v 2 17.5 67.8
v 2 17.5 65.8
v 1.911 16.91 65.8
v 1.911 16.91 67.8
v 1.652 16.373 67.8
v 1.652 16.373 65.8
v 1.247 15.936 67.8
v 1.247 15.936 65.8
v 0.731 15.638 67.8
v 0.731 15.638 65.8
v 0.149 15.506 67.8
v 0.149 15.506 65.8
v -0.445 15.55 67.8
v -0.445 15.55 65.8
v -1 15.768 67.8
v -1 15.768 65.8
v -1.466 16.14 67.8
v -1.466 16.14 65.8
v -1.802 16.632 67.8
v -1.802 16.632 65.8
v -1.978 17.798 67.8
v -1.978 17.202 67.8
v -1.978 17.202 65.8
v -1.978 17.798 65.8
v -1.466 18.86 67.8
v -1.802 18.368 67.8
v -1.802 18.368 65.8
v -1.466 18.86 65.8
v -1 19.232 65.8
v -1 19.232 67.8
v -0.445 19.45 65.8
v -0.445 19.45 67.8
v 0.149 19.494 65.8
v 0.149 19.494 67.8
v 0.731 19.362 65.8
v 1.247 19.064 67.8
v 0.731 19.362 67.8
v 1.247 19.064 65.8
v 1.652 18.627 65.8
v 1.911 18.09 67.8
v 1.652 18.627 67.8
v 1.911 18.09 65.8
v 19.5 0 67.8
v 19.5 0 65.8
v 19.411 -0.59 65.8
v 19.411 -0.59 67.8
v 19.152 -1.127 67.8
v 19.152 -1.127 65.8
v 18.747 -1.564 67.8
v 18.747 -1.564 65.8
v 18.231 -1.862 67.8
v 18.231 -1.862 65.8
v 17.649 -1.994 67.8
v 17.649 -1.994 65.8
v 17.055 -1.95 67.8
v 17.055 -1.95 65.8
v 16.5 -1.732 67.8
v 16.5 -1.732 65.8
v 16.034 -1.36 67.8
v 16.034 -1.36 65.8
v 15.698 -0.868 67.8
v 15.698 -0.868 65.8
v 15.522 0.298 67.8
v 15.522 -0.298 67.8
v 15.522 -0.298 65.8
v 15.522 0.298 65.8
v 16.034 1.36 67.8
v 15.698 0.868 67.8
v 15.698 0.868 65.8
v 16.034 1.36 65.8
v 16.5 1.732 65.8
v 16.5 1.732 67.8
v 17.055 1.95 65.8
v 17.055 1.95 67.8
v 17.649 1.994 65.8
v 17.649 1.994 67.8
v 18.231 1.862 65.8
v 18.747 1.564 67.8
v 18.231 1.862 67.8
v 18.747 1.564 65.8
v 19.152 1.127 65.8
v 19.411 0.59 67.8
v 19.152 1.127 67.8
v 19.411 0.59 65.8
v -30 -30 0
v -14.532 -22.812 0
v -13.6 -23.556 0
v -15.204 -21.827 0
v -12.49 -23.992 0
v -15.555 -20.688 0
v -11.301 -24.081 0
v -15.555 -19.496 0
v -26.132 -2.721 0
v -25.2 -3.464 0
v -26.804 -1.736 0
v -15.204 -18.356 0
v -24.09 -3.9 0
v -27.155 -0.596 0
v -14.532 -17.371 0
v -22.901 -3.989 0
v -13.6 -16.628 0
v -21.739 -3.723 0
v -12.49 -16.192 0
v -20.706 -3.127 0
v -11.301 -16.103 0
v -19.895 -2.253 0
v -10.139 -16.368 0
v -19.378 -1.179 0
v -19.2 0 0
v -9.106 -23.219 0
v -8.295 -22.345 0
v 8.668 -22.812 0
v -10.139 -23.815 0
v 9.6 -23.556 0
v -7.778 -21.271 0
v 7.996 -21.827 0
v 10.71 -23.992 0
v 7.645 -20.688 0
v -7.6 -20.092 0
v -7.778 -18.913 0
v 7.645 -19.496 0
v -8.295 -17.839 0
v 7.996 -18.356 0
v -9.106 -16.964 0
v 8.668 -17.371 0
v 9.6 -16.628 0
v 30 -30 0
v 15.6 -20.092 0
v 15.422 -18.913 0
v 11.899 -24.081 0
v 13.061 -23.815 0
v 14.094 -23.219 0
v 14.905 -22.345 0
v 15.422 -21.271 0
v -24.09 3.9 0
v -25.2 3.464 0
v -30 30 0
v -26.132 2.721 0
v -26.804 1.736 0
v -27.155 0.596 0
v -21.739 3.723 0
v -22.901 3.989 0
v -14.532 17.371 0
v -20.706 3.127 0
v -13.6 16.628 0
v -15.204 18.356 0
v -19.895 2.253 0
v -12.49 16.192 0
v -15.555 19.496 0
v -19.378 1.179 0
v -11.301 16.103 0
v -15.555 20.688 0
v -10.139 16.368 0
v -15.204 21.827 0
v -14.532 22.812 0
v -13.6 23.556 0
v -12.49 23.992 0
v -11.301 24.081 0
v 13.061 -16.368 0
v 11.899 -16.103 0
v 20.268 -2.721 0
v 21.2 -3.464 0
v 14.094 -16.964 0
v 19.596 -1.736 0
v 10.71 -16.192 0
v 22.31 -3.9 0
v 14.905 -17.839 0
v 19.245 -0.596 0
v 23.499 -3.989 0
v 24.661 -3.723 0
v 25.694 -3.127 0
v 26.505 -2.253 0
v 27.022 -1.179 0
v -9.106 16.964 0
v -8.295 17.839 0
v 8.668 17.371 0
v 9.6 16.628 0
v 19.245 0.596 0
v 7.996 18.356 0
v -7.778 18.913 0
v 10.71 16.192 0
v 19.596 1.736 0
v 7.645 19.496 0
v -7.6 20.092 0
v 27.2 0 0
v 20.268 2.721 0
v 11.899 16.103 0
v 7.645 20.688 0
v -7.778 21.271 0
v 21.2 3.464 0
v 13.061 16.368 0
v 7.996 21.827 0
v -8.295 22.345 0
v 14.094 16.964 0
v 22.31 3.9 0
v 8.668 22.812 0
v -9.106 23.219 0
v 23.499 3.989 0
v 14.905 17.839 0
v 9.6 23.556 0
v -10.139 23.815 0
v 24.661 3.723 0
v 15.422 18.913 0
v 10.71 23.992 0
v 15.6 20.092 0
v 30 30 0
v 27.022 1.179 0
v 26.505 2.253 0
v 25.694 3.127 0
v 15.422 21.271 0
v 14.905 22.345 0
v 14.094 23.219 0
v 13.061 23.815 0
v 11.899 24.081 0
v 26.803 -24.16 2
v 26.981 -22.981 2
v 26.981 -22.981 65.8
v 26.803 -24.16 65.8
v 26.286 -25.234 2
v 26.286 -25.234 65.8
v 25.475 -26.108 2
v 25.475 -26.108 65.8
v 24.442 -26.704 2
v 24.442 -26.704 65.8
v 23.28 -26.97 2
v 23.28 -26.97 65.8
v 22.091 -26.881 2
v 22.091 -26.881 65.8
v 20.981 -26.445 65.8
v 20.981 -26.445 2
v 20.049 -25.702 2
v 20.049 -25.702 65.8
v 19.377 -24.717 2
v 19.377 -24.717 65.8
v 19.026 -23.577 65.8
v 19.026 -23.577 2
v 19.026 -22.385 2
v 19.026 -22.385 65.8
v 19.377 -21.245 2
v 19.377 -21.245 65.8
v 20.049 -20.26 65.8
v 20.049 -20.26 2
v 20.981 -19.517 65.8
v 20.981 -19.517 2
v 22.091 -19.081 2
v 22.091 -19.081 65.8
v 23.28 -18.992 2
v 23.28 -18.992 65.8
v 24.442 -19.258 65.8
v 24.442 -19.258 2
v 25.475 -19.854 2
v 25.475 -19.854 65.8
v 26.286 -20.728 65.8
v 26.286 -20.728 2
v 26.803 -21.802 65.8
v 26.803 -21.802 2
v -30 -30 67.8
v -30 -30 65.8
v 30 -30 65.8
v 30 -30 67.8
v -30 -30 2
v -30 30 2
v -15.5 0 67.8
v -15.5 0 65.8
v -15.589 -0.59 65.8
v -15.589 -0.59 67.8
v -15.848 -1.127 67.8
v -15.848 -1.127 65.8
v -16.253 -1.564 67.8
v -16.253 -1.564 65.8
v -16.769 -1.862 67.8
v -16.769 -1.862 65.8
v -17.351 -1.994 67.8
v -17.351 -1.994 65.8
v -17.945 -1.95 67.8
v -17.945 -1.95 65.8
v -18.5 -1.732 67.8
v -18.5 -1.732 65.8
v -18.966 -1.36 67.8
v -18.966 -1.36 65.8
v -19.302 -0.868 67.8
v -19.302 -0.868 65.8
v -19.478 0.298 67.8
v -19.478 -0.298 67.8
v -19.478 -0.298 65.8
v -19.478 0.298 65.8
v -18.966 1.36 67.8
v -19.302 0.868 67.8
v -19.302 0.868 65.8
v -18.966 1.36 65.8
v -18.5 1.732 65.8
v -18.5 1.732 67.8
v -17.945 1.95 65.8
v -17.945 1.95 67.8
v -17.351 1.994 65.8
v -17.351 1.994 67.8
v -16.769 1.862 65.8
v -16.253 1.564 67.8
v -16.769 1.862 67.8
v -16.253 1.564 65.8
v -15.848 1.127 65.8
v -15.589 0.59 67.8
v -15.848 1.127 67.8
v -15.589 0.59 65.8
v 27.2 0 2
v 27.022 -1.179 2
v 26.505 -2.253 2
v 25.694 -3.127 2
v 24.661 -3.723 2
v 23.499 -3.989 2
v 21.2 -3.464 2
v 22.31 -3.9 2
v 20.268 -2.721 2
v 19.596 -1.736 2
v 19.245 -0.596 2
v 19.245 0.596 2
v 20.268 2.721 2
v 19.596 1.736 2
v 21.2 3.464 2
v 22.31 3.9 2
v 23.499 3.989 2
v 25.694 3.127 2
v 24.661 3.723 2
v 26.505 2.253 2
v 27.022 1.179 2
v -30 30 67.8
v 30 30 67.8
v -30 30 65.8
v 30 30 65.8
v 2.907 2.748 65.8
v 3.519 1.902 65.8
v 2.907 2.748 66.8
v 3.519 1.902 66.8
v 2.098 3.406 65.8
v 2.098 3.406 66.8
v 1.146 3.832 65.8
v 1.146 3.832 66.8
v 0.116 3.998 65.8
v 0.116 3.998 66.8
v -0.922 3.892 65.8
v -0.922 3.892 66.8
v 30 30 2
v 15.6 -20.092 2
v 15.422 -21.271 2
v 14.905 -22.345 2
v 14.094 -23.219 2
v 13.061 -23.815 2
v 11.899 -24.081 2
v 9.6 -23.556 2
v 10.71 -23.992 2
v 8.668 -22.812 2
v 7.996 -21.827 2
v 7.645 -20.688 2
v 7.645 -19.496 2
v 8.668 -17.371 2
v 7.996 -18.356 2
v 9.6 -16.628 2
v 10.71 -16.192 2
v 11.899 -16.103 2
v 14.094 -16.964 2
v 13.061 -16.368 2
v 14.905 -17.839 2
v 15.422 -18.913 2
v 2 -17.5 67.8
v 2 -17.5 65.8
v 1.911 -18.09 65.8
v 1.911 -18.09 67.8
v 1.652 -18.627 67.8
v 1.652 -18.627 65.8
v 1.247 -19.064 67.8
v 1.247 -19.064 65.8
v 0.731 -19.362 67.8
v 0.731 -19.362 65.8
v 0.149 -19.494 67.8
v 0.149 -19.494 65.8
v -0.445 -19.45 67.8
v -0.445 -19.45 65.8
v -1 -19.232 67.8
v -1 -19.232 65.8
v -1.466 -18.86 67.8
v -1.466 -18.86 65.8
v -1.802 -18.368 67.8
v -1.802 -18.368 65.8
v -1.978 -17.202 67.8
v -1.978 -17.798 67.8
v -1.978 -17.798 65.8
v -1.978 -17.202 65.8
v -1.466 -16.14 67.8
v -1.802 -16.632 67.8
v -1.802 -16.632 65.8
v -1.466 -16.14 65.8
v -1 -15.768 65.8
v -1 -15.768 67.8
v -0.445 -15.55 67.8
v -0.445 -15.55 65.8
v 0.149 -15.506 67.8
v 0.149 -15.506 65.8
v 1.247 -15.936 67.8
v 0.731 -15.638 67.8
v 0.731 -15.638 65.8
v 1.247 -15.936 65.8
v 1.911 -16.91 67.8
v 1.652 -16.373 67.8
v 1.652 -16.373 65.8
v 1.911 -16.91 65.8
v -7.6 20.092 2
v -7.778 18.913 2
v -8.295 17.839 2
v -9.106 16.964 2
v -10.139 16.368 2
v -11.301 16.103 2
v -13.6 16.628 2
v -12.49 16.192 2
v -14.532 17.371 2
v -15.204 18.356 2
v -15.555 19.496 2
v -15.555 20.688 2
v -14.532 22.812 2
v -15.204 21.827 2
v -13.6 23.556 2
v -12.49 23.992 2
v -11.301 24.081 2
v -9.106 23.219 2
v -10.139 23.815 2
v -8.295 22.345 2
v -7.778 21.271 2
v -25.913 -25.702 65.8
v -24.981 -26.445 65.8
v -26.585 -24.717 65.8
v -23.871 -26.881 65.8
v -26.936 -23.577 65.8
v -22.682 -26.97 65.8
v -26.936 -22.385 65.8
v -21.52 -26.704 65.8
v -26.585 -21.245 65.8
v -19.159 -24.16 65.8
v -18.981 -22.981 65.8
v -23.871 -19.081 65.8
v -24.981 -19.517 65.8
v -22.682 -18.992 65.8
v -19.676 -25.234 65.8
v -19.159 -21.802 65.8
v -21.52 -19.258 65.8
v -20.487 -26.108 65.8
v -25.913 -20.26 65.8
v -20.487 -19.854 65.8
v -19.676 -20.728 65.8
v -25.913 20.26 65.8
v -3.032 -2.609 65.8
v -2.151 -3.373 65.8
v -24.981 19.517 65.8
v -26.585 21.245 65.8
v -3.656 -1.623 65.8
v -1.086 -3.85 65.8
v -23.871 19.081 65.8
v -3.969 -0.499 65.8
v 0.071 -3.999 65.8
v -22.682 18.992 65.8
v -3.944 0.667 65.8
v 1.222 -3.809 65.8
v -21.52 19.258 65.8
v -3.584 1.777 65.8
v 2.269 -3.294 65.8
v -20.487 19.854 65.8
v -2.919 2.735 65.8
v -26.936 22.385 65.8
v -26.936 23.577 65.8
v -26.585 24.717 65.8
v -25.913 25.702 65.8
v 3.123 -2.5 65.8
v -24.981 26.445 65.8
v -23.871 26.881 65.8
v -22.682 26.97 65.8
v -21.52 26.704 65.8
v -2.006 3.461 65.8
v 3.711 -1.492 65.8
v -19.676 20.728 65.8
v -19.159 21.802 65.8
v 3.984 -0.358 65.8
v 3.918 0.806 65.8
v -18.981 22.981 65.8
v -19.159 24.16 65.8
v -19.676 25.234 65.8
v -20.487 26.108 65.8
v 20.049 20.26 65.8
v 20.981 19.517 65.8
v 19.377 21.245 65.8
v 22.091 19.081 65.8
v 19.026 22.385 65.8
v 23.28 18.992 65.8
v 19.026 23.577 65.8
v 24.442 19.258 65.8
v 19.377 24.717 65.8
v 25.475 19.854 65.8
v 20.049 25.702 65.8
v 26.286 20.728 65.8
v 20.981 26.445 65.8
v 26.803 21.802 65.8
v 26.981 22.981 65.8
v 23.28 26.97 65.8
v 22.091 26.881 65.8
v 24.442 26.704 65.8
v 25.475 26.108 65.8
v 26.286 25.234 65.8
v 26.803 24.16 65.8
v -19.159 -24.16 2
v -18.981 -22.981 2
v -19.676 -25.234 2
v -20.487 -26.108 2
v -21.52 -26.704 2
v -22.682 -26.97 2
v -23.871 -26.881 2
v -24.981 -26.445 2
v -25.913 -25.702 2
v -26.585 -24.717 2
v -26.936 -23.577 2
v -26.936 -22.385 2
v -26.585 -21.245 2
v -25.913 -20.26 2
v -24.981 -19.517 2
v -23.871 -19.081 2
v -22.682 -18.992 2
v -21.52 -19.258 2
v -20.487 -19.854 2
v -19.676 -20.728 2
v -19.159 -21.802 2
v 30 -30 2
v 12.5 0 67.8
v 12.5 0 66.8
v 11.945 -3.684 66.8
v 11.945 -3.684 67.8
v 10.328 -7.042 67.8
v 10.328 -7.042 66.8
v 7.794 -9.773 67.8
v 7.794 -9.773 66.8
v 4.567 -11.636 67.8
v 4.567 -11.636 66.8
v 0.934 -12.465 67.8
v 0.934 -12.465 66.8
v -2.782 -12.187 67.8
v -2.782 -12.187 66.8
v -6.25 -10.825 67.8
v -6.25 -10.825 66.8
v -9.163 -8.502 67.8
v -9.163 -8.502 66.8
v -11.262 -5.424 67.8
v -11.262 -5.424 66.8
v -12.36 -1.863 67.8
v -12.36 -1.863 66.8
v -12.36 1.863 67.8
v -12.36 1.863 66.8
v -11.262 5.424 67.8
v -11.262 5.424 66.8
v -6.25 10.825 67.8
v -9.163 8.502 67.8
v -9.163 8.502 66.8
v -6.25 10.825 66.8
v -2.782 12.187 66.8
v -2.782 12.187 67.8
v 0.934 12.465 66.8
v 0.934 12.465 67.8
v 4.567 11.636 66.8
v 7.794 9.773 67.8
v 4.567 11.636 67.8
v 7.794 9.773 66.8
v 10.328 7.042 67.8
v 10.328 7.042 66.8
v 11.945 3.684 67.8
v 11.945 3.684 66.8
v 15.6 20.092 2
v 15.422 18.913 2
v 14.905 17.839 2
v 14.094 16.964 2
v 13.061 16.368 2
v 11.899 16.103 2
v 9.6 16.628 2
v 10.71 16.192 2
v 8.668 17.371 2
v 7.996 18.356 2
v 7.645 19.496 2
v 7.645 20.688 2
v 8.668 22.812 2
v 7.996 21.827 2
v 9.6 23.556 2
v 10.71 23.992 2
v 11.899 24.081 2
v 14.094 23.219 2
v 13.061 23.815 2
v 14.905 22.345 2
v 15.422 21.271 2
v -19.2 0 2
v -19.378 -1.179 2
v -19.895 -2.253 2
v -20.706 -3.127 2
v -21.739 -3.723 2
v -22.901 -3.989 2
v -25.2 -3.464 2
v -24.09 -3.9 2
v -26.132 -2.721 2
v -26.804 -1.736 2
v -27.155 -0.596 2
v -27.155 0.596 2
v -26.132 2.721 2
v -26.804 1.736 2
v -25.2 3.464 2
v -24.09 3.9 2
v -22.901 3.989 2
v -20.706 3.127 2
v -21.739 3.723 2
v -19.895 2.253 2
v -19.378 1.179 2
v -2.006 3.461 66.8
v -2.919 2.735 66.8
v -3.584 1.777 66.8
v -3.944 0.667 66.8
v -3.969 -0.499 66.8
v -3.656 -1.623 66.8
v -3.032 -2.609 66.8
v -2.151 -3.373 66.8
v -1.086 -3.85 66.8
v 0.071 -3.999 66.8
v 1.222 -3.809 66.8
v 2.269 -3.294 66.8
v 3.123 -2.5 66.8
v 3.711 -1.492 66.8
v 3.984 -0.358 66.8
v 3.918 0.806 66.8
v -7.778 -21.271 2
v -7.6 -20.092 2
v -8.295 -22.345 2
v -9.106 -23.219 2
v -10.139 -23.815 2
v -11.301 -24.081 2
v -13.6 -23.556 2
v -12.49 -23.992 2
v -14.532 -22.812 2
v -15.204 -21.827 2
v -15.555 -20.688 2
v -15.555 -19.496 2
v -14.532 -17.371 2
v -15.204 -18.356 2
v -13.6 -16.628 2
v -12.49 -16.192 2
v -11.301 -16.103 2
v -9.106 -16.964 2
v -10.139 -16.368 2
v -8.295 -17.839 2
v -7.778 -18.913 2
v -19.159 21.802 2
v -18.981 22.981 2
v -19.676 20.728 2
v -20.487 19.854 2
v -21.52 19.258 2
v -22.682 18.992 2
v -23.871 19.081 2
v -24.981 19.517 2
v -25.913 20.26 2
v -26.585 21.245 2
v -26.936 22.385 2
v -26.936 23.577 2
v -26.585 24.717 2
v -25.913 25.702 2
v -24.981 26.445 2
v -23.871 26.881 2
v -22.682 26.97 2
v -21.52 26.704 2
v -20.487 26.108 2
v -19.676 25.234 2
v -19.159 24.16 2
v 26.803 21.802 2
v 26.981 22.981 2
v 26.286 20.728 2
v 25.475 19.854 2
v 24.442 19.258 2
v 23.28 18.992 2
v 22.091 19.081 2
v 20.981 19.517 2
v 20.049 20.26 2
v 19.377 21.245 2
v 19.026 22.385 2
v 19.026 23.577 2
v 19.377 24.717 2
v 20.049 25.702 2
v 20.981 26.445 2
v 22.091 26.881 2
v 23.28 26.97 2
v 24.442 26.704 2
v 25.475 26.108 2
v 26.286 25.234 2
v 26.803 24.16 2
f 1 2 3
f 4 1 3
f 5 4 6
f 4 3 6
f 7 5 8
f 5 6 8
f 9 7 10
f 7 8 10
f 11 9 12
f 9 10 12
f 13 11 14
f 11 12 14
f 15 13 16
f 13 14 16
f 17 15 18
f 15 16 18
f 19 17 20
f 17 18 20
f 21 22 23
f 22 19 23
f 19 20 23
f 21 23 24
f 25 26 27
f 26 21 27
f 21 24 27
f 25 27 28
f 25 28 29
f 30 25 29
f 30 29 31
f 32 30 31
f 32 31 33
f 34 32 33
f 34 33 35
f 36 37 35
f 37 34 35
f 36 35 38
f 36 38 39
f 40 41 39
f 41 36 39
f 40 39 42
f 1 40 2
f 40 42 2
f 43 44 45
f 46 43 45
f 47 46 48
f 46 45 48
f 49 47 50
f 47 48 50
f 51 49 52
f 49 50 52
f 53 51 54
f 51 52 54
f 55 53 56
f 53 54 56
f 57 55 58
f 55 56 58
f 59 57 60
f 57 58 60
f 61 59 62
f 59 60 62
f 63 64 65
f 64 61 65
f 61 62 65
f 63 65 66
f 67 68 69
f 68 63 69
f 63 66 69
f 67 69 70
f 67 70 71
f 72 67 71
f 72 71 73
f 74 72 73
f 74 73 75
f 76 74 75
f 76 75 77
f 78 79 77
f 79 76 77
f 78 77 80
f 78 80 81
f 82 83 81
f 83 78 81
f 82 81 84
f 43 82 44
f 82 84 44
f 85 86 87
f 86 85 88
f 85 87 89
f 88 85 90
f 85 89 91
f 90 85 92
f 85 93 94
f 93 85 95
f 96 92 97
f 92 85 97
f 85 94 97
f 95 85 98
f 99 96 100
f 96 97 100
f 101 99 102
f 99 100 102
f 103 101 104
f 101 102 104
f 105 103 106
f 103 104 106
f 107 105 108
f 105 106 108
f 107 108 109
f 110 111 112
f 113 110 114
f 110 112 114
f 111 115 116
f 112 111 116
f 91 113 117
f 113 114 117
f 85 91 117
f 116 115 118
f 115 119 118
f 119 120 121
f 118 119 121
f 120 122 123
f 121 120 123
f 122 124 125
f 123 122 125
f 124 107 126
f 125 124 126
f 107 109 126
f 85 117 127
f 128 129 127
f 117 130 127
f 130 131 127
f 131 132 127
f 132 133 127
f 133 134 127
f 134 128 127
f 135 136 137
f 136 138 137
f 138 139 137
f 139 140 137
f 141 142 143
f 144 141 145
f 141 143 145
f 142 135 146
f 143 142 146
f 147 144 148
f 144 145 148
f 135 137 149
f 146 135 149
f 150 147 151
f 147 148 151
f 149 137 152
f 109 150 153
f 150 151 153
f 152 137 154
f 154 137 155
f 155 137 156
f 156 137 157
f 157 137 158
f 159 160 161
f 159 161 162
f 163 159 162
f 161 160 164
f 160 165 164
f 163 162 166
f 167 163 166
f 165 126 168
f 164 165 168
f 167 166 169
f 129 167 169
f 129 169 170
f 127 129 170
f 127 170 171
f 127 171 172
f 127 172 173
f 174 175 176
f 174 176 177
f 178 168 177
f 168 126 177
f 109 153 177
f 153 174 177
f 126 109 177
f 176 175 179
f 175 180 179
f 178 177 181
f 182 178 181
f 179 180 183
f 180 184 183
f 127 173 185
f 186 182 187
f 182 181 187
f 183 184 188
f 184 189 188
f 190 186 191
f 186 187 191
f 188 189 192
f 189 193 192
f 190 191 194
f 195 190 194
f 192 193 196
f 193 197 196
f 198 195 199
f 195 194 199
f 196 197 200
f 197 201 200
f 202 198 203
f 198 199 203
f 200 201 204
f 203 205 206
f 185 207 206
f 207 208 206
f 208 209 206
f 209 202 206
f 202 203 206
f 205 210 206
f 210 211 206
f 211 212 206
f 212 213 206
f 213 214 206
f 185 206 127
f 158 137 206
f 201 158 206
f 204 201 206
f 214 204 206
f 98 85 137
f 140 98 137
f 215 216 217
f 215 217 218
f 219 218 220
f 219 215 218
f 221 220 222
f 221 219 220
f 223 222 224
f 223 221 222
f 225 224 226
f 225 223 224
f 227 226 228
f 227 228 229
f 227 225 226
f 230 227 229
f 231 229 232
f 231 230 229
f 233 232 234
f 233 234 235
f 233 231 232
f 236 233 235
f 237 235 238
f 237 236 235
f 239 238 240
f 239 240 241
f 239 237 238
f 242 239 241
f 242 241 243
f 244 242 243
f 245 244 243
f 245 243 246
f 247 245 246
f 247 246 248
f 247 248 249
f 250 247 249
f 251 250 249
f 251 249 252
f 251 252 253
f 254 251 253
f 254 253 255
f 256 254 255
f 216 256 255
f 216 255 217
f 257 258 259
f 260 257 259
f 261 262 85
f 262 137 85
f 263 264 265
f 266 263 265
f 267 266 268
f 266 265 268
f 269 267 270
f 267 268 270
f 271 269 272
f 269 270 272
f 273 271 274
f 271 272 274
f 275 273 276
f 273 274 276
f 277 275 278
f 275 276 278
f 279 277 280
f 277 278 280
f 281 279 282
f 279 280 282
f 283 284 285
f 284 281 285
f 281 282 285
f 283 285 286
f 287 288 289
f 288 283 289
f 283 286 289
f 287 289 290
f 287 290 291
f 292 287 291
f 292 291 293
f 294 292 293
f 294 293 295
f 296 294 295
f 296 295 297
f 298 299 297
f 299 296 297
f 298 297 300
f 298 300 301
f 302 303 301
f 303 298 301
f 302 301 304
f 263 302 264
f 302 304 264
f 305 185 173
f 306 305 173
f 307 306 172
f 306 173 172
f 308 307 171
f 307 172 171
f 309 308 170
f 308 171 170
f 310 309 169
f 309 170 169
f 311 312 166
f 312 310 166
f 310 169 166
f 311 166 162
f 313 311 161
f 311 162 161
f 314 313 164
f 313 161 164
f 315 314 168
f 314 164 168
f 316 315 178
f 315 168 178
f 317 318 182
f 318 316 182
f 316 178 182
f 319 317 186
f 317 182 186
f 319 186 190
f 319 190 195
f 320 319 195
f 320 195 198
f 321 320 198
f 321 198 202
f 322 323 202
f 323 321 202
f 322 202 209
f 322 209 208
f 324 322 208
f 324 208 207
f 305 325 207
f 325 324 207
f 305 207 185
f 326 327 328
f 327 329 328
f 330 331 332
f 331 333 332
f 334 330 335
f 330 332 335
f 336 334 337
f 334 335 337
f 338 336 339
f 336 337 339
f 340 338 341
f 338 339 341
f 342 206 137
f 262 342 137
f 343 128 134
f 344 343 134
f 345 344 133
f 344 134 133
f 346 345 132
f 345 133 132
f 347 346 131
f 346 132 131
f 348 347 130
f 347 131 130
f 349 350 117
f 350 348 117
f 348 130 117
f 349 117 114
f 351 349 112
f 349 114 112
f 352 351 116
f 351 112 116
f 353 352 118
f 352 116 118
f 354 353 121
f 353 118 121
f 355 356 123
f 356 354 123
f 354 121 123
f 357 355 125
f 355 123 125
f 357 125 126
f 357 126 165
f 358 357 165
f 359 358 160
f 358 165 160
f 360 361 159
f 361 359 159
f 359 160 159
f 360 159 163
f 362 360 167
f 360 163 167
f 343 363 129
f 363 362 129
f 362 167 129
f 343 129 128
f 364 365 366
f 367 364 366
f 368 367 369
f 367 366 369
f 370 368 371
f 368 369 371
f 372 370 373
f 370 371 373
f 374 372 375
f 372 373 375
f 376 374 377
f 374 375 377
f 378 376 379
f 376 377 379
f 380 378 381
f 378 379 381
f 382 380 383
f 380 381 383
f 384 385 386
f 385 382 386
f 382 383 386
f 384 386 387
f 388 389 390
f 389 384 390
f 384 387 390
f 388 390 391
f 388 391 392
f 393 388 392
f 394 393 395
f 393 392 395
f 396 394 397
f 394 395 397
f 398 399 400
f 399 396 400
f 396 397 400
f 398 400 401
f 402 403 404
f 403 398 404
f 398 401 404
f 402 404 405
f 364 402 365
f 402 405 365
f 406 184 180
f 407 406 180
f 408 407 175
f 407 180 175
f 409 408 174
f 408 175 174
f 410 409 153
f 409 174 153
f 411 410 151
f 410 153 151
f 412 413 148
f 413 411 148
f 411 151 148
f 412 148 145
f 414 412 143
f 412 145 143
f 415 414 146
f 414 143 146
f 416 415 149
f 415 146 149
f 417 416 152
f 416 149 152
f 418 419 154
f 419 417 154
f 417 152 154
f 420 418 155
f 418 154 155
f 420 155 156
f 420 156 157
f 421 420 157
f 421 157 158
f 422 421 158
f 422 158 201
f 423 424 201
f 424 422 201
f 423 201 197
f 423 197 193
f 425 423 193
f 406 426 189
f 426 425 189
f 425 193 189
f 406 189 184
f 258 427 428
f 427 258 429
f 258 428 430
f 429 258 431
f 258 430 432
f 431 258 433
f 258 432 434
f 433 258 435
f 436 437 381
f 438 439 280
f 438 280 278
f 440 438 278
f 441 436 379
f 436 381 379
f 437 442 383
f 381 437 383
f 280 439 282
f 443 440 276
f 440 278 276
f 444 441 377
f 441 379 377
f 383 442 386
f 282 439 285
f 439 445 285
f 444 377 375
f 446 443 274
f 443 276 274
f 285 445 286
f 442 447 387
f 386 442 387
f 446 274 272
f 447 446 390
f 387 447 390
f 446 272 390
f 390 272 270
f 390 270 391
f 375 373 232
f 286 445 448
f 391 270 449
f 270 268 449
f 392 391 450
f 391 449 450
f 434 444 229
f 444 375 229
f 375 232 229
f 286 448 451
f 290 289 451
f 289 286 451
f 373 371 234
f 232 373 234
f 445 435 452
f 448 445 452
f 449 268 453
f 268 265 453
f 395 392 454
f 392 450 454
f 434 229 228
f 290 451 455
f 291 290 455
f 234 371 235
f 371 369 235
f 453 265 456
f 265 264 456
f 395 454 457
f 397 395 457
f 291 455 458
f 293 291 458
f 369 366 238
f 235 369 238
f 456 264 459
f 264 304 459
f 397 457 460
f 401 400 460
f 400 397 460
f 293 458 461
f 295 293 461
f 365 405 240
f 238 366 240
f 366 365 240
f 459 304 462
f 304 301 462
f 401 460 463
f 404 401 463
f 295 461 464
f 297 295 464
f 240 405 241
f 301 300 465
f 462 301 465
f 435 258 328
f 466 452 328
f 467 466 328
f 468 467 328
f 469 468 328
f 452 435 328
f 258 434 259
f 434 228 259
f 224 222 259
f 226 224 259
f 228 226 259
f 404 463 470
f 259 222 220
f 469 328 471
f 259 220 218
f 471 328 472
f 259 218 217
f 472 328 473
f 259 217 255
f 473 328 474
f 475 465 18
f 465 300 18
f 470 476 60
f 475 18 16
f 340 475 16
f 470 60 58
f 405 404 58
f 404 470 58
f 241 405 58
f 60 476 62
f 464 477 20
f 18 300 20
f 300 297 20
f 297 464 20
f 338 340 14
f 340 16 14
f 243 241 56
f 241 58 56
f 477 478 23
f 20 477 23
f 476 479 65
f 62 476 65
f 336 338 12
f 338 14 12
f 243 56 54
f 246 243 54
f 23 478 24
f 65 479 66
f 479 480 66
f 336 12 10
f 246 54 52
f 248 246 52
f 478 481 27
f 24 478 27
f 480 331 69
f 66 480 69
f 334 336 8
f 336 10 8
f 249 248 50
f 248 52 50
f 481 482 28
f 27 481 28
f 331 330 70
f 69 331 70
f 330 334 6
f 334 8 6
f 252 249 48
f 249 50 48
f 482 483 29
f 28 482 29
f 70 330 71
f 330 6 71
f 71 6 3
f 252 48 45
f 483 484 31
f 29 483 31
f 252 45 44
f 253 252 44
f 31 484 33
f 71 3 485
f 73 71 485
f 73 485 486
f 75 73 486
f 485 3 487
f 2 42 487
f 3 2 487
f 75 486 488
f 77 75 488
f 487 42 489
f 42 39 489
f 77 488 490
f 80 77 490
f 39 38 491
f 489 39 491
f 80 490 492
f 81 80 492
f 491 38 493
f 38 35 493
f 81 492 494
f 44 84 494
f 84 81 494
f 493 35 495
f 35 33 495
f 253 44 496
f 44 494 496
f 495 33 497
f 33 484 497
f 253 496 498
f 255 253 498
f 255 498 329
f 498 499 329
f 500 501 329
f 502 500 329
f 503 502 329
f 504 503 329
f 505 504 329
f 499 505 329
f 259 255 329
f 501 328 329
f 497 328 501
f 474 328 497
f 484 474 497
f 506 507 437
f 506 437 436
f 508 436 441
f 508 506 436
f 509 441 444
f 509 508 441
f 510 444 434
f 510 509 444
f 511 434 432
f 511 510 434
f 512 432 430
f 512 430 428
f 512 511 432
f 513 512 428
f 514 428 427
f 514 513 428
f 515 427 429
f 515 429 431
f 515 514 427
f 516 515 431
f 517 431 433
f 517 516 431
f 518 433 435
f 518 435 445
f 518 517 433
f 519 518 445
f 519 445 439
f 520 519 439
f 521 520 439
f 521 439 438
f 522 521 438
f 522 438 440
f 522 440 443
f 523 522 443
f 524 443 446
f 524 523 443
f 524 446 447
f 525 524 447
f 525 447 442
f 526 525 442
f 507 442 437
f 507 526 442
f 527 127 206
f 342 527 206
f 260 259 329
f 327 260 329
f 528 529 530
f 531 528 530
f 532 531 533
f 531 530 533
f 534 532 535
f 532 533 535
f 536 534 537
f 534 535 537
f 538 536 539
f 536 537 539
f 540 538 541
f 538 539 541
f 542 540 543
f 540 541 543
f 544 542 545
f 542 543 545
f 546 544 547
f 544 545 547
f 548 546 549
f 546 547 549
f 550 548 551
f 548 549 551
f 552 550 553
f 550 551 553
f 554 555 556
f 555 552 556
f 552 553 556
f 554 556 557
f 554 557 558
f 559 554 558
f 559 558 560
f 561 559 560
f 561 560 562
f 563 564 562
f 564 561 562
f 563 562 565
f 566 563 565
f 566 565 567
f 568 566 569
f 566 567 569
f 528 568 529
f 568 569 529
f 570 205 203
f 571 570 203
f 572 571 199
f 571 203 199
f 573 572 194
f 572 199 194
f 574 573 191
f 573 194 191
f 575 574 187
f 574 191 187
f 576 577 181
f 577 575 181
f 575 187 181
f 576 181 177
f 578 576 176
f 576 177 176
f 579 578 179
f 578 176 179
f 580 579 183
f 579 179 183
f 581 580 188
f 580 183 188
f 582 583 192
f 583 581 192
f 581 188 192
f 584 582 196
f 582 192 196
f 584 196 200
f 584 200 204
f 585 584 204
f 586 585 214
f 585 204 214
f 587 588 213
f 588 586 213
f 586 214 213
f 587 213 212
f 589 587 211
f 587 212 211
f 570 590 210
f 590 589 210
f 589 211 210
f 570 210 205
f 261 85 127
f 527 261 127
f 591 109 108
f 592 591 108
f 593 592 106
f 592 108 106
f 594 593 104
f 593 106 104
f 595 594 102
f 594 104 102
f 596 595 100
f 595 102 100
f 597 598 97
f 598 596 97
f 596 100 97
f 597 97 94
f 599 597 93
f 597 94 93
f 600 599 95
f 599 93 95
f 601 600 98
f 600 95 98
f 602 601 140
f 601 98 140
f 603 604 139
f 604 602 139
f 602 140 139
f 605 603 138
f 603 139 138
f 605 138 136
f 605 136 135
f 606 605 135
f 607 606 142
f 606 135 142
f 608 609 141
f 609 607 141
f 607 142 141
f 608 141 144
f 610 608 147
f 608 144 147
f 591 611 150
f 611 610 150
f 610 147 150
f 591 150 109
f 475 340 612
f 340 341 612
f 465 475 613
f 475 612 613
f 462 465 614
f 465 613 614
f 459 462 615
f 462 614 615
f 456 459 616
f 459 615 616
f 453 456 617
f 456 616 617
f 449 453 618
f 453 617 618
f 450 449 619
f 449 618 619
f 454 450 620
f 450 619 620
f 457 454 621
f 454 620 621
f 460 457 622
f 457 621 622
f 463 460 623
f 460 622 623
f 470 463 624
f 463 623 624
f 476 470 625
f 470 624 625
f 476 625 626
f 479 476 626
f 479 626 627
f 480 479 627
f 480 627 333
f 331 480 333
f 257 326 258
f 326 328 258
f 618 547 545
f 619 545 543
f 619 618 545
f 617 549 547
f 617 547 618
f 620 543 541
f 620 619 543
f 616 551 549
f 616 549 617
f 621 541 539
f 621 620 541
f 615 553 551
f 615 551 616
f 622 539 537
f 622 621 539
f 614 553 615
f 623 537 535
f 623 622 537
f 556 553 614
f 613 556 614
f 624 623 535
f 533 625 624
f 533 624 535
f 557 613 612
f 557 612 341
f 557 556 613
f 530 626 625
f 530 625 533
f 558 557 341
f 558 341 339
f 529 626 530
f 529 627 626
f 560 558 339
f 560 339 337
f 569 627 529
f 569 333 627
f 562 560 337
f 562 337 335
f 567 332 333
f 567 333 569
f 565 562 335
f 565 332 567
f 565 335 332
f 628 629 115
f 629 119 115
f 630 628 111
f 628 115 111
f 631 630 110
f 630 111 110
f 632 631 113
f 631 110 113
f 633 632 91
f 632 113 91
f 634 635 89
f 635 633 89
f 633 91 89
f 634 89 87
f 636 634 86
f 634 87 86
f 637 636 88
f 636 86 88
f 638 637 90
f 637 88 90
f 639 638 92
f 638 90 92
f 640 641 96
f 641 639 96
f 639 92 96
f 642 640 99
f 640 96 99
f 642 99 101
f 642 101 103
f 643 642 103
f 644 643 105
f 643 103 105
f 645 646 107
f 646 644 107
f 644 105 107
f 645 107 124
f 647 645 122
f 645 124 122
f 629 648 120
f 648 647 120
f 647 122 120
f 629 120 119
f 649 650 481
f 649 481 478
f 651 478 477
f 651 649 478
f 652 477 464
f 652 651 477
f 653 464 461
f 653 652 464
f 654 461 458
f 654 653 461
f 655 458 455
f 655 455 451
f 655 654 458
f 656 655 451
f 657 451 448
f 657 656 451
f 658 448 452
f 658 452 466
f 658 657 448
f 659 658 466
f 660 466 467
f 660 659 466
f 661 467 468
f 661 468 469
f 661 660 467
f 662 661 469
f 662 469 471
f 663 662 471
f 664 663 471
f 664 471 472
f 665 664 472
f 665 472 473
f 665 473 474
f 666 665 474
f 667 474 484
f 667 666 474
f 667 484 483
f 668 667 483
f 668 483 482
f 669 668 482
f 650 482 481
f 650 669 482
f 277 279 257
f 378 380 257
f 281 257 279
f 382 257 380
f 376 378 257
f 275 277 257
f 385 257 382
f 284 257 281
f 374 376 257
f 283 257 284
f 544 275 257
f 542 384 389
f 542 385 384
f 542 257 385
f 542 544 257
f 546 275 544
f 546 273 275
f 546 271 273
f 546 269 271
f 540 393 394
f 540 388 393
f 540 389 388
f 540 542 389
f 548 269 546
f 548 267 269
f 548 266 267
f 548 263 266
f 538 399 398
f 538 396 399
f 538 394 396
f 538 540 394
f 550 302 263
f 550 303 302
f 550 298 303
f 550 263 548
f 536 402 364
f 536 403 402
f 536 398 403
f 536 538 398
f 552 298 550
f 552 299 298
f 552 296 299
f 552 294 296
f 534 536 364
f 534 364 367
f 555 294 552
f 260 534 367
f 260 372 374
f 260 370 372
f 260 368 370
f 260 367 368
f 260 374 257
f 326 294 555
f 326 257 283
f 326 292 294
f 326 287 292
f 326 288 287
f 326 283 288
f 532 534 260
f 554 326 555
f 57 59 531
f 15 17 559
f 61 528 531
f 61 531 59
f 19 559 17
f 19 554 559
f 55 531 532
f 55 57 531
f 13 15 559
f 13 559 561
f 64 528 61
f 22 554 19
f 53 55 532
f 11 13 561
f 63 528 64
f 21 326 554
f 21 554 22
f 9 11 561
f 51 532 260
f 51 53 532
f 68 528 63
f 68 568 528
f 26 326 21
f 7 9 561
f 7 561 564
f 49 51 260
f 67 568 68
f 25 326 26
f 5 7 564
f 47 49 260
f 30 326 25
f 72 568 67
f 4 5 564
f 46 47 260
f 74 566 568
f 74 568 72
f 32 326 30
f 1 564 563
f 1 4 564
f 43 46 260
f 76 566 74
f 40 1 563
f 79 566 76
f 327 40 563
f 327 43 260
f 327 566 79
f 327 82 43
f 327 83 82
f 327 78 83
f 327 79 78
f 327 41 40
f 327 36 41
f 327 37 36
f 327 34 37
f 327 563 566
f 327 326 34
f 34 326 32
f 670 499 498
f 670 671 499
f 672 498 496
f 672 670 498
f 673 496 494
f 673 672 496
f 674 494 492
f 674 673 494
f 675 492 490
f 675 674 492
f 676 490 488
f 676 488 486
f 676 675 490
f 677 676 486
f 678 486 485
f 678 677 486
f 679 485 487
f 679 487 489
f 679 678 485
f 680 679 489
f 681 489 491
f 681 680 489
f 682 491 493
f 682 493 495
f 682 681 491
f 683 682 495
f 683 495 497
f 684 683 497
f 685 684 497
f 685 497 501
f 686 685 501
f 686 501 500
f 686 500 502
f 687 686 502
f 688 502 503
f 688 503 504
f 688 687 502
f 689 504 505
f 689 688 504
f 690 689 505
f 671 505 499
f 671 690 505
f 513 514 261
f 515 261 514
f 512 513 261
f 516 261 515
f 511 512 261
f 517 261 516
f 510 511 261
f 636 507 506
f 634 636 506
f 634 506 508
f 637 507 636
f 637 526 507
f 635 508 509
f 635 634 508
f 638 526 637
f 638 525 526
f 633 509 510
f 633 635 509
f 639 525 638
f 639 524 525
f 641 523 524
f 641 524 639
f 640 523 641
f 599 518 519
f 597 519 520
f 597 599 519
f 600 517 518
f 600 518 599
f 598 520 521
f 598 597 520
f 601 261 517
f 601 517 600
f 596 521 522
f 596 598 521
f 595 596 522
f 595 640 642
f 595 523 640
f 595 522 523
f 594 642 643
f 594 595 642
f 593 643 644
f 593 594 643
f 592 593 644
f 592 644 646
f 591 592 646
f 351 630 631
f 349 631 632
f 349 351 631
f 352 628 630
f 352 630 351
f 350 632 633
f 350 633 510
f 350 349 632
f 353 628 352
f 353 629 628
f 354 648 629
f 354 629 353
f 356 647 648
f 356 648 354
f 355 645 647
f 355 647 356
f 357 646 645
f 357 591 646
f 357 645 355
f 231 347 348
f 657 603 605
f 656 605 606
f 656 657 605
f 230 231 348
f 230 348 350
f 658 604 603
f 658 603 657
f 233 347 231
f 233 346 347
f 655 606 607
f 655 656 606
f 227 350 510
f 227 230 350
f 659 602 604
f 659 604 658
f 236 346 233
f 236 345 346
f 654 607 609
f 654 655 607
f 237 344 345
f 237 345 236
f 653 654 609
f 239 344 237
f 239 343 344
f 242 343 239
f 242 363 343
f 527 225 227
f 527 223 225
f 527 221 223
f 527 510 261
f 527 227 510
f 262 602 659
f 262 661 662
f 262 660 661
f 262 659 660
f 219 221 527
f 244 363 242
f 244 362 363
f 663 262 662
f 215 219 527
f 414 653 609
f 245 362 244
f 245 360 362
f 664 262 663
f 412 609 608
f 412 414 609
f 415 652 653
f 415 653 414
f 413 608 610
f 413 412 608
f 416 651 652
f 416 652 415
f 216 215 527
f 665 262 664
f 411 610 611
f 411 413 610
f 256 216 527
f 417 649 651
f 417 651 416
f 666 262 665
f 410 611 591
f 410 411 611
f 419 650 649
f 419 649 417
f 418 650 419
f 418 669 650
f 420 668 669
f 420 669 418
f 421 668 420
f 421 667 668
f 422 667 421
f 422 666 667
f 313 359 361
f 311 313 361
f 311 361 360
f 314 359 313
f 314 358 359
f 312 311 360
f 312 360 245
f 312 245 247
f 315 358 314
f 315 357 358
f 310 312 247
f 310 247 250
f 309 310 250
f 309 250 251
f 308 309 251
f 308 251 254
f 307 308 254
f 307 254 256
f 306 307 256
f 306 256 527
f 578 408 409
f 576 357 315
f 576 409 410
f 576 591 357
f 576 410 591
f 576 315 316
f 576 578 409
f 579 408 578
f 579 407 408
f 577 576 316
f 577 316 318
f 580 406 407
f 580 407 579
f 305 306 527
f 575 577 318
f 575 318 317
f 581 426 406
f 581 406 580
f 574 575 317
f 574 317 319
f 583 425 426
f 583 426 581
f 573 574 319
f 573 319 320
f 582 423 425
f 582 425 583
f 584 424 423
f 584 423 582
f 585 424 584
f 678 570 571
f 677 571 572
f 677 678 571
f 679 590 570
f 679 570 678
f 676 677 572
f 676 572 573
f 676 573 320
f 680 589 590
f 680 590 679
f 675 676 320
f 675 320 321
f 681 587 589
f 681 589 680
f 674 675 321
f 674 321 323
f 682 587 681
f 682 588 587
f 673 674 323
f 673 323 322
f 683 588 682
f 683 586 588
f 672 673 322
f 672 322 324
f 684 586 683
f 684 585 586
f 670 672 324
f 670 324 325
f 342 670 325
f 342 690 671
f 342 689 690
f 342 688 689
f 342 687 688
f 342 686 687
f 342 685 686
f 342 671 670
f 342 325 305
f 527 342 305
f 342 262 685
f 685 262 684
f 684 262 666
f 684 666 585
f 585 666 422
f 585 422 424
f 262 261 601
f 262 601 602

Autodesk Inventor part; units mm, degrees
ref_plane "YZ Plane" through (0, 0, 0) normal (1, 0, 0) x (0, 1, 0)
ref_plane "XZ Plane" through (0, 0, 0) normal (0, 1, 0) x (-1, 0, 0)
ref_plane "Work Plane1" through (0, 0, 0) normal (0, 0, 1) x (1, 0, 0)
sketch "Sketch1" plane through (0, 0, 0) normal (0, 0, 1) x (1, 0, 0)
  line L0 (-30, -30) -> (30, -30)
  line L1 (30, -30) -> (30, 30)
  line L2 (30, 30) -> (-30, 30)
  line L3 (-30, 30) -> (-30, -30)
  line L4 (-30, -30) -> (30, 30) construction
  line L5 (30, -30) -> (-30, 30) construction
  circle A0 centre (-11.6, 20.0918) radius 4 projected
  circle A1 centre (11.6, 20.0918) radius 4 projected
  circle A2 centre (-23.2, 0) radius 4 projected
  circle A3 centre (23.2, 0) radius 4 projected
  circle A4 centre (11.6, -20.0918) radius 4 projected
  circle A5 centre (-11.6, -20.0918) radius 4 projected
  point P0 (0, 0)
  point P1 (-9.5215, -21.2918)
  dimension "d0" = 60
extrude "Extrusion1" add sketch "Sketch1" along normal blind 2
sketch "Sketch2" plane through (0, 0, 2) normal (0, 0, 1) x (1, 0, 0)
  line L0 (22.981, -22.981) -> (-22.981, -22.981) construction
  line L1 (-22.981, -22.981) -> (-22.981, 22.981) construction
  line L2 (-22.981, 22.981) -> (22.981, 22.981) construction
  line L3 (22.981, 22.981) -> (22.981, -22.981) construction
  line L4 (22.981, -22.981) -> (-22.981, 22.981) construction
  line L5 (-22.981, -22.981) -> (22.981, 22.981) construction
  circle A0 centre (0, 0) radius 32.5 construction
  circle A1 centre (-22.981, -22.981) radius 4
  circle A2 centre (22.981, -22.981) radius 4
  circle A3 centre (22.981, 22.981) radius 4
  circle A4 centre (-22.981, 22.981) radius 4
  dimension "d4" = 65
  dimension "d5" = 8
  dimension "d8" = 360
ref_plane "Work Plane2" through (-12.5, -12.5, 66.8) normal (0, 0, -1) x (0, 1, 0)
extrude "Extrusion2" add sketch "Sketch2" along normal up to surface (64.8 mm away)
sketch "Sketch3" plane through (-22.981, -22.981, 66.8) normal (0, 0, 1) x (1, 0, 0)
  line L0 (-7.019, -7.019) -> (52.981, -7.019) projected
  line L1 (52.981, -7.019) -> (52.981, 52.981) projected
  line L2 (-7.019, 52.981) -> (-7.019, -7.019) projected
  line L3 (52.981, 52.981) -> (-7.019, 52.981) projected
  circle A0 centre (5.481, 22.981) radius 2 projected
  circle A1 centre (22.981, 40.481) radius 2 projected
  circle A2 centre (40.481, 22.981) radius 2 projected
  circle A3 centre (22.981, 5.481) radius 2 projected
  arc A4 (22.0591, 26.8733) -> (26.4996, 24.8834) centre (22.981, 22.981) ccw projected
  circle A5 centre (22.981, 22.981) radius 4 projected
  point P0 (22.981, 22.981)
extrude "Extrusion3" add sketch "Sketch3" against normal blind 1
sketch "Sketch4" plane through (-30, -30, 66.8) normal (0, 0, 1) x (1, 0, 0)
  line L0 (0, 60) -> (0, 0) projected
  line L1 (0, 0) -> (60, 0) projected
  line L2 (60, 0) -> (60, 60) projected
  line L3 (60, 60) -> (0, 60) projected
  circle A0 centre (30, 30) radius 4 projected
  circle A1 centre (30, 12.5) radius 2 projected
  circle A2 centre (47.5, 30) radius 2 projected
  circle A3 centre (30, 47.5) radius 2 projected
  circle A4 centre (12.5, 30) radius 2 projected
  circle A5 centre (30, 30) radius 12.5 projected
  point P0 (30, 30)
extrude "Extrusion4" add sketch "Sketch4" along normal blind 1 contours L3 L2 L1 L0
properties part number "mega troque motor flange for nmrv-40"
